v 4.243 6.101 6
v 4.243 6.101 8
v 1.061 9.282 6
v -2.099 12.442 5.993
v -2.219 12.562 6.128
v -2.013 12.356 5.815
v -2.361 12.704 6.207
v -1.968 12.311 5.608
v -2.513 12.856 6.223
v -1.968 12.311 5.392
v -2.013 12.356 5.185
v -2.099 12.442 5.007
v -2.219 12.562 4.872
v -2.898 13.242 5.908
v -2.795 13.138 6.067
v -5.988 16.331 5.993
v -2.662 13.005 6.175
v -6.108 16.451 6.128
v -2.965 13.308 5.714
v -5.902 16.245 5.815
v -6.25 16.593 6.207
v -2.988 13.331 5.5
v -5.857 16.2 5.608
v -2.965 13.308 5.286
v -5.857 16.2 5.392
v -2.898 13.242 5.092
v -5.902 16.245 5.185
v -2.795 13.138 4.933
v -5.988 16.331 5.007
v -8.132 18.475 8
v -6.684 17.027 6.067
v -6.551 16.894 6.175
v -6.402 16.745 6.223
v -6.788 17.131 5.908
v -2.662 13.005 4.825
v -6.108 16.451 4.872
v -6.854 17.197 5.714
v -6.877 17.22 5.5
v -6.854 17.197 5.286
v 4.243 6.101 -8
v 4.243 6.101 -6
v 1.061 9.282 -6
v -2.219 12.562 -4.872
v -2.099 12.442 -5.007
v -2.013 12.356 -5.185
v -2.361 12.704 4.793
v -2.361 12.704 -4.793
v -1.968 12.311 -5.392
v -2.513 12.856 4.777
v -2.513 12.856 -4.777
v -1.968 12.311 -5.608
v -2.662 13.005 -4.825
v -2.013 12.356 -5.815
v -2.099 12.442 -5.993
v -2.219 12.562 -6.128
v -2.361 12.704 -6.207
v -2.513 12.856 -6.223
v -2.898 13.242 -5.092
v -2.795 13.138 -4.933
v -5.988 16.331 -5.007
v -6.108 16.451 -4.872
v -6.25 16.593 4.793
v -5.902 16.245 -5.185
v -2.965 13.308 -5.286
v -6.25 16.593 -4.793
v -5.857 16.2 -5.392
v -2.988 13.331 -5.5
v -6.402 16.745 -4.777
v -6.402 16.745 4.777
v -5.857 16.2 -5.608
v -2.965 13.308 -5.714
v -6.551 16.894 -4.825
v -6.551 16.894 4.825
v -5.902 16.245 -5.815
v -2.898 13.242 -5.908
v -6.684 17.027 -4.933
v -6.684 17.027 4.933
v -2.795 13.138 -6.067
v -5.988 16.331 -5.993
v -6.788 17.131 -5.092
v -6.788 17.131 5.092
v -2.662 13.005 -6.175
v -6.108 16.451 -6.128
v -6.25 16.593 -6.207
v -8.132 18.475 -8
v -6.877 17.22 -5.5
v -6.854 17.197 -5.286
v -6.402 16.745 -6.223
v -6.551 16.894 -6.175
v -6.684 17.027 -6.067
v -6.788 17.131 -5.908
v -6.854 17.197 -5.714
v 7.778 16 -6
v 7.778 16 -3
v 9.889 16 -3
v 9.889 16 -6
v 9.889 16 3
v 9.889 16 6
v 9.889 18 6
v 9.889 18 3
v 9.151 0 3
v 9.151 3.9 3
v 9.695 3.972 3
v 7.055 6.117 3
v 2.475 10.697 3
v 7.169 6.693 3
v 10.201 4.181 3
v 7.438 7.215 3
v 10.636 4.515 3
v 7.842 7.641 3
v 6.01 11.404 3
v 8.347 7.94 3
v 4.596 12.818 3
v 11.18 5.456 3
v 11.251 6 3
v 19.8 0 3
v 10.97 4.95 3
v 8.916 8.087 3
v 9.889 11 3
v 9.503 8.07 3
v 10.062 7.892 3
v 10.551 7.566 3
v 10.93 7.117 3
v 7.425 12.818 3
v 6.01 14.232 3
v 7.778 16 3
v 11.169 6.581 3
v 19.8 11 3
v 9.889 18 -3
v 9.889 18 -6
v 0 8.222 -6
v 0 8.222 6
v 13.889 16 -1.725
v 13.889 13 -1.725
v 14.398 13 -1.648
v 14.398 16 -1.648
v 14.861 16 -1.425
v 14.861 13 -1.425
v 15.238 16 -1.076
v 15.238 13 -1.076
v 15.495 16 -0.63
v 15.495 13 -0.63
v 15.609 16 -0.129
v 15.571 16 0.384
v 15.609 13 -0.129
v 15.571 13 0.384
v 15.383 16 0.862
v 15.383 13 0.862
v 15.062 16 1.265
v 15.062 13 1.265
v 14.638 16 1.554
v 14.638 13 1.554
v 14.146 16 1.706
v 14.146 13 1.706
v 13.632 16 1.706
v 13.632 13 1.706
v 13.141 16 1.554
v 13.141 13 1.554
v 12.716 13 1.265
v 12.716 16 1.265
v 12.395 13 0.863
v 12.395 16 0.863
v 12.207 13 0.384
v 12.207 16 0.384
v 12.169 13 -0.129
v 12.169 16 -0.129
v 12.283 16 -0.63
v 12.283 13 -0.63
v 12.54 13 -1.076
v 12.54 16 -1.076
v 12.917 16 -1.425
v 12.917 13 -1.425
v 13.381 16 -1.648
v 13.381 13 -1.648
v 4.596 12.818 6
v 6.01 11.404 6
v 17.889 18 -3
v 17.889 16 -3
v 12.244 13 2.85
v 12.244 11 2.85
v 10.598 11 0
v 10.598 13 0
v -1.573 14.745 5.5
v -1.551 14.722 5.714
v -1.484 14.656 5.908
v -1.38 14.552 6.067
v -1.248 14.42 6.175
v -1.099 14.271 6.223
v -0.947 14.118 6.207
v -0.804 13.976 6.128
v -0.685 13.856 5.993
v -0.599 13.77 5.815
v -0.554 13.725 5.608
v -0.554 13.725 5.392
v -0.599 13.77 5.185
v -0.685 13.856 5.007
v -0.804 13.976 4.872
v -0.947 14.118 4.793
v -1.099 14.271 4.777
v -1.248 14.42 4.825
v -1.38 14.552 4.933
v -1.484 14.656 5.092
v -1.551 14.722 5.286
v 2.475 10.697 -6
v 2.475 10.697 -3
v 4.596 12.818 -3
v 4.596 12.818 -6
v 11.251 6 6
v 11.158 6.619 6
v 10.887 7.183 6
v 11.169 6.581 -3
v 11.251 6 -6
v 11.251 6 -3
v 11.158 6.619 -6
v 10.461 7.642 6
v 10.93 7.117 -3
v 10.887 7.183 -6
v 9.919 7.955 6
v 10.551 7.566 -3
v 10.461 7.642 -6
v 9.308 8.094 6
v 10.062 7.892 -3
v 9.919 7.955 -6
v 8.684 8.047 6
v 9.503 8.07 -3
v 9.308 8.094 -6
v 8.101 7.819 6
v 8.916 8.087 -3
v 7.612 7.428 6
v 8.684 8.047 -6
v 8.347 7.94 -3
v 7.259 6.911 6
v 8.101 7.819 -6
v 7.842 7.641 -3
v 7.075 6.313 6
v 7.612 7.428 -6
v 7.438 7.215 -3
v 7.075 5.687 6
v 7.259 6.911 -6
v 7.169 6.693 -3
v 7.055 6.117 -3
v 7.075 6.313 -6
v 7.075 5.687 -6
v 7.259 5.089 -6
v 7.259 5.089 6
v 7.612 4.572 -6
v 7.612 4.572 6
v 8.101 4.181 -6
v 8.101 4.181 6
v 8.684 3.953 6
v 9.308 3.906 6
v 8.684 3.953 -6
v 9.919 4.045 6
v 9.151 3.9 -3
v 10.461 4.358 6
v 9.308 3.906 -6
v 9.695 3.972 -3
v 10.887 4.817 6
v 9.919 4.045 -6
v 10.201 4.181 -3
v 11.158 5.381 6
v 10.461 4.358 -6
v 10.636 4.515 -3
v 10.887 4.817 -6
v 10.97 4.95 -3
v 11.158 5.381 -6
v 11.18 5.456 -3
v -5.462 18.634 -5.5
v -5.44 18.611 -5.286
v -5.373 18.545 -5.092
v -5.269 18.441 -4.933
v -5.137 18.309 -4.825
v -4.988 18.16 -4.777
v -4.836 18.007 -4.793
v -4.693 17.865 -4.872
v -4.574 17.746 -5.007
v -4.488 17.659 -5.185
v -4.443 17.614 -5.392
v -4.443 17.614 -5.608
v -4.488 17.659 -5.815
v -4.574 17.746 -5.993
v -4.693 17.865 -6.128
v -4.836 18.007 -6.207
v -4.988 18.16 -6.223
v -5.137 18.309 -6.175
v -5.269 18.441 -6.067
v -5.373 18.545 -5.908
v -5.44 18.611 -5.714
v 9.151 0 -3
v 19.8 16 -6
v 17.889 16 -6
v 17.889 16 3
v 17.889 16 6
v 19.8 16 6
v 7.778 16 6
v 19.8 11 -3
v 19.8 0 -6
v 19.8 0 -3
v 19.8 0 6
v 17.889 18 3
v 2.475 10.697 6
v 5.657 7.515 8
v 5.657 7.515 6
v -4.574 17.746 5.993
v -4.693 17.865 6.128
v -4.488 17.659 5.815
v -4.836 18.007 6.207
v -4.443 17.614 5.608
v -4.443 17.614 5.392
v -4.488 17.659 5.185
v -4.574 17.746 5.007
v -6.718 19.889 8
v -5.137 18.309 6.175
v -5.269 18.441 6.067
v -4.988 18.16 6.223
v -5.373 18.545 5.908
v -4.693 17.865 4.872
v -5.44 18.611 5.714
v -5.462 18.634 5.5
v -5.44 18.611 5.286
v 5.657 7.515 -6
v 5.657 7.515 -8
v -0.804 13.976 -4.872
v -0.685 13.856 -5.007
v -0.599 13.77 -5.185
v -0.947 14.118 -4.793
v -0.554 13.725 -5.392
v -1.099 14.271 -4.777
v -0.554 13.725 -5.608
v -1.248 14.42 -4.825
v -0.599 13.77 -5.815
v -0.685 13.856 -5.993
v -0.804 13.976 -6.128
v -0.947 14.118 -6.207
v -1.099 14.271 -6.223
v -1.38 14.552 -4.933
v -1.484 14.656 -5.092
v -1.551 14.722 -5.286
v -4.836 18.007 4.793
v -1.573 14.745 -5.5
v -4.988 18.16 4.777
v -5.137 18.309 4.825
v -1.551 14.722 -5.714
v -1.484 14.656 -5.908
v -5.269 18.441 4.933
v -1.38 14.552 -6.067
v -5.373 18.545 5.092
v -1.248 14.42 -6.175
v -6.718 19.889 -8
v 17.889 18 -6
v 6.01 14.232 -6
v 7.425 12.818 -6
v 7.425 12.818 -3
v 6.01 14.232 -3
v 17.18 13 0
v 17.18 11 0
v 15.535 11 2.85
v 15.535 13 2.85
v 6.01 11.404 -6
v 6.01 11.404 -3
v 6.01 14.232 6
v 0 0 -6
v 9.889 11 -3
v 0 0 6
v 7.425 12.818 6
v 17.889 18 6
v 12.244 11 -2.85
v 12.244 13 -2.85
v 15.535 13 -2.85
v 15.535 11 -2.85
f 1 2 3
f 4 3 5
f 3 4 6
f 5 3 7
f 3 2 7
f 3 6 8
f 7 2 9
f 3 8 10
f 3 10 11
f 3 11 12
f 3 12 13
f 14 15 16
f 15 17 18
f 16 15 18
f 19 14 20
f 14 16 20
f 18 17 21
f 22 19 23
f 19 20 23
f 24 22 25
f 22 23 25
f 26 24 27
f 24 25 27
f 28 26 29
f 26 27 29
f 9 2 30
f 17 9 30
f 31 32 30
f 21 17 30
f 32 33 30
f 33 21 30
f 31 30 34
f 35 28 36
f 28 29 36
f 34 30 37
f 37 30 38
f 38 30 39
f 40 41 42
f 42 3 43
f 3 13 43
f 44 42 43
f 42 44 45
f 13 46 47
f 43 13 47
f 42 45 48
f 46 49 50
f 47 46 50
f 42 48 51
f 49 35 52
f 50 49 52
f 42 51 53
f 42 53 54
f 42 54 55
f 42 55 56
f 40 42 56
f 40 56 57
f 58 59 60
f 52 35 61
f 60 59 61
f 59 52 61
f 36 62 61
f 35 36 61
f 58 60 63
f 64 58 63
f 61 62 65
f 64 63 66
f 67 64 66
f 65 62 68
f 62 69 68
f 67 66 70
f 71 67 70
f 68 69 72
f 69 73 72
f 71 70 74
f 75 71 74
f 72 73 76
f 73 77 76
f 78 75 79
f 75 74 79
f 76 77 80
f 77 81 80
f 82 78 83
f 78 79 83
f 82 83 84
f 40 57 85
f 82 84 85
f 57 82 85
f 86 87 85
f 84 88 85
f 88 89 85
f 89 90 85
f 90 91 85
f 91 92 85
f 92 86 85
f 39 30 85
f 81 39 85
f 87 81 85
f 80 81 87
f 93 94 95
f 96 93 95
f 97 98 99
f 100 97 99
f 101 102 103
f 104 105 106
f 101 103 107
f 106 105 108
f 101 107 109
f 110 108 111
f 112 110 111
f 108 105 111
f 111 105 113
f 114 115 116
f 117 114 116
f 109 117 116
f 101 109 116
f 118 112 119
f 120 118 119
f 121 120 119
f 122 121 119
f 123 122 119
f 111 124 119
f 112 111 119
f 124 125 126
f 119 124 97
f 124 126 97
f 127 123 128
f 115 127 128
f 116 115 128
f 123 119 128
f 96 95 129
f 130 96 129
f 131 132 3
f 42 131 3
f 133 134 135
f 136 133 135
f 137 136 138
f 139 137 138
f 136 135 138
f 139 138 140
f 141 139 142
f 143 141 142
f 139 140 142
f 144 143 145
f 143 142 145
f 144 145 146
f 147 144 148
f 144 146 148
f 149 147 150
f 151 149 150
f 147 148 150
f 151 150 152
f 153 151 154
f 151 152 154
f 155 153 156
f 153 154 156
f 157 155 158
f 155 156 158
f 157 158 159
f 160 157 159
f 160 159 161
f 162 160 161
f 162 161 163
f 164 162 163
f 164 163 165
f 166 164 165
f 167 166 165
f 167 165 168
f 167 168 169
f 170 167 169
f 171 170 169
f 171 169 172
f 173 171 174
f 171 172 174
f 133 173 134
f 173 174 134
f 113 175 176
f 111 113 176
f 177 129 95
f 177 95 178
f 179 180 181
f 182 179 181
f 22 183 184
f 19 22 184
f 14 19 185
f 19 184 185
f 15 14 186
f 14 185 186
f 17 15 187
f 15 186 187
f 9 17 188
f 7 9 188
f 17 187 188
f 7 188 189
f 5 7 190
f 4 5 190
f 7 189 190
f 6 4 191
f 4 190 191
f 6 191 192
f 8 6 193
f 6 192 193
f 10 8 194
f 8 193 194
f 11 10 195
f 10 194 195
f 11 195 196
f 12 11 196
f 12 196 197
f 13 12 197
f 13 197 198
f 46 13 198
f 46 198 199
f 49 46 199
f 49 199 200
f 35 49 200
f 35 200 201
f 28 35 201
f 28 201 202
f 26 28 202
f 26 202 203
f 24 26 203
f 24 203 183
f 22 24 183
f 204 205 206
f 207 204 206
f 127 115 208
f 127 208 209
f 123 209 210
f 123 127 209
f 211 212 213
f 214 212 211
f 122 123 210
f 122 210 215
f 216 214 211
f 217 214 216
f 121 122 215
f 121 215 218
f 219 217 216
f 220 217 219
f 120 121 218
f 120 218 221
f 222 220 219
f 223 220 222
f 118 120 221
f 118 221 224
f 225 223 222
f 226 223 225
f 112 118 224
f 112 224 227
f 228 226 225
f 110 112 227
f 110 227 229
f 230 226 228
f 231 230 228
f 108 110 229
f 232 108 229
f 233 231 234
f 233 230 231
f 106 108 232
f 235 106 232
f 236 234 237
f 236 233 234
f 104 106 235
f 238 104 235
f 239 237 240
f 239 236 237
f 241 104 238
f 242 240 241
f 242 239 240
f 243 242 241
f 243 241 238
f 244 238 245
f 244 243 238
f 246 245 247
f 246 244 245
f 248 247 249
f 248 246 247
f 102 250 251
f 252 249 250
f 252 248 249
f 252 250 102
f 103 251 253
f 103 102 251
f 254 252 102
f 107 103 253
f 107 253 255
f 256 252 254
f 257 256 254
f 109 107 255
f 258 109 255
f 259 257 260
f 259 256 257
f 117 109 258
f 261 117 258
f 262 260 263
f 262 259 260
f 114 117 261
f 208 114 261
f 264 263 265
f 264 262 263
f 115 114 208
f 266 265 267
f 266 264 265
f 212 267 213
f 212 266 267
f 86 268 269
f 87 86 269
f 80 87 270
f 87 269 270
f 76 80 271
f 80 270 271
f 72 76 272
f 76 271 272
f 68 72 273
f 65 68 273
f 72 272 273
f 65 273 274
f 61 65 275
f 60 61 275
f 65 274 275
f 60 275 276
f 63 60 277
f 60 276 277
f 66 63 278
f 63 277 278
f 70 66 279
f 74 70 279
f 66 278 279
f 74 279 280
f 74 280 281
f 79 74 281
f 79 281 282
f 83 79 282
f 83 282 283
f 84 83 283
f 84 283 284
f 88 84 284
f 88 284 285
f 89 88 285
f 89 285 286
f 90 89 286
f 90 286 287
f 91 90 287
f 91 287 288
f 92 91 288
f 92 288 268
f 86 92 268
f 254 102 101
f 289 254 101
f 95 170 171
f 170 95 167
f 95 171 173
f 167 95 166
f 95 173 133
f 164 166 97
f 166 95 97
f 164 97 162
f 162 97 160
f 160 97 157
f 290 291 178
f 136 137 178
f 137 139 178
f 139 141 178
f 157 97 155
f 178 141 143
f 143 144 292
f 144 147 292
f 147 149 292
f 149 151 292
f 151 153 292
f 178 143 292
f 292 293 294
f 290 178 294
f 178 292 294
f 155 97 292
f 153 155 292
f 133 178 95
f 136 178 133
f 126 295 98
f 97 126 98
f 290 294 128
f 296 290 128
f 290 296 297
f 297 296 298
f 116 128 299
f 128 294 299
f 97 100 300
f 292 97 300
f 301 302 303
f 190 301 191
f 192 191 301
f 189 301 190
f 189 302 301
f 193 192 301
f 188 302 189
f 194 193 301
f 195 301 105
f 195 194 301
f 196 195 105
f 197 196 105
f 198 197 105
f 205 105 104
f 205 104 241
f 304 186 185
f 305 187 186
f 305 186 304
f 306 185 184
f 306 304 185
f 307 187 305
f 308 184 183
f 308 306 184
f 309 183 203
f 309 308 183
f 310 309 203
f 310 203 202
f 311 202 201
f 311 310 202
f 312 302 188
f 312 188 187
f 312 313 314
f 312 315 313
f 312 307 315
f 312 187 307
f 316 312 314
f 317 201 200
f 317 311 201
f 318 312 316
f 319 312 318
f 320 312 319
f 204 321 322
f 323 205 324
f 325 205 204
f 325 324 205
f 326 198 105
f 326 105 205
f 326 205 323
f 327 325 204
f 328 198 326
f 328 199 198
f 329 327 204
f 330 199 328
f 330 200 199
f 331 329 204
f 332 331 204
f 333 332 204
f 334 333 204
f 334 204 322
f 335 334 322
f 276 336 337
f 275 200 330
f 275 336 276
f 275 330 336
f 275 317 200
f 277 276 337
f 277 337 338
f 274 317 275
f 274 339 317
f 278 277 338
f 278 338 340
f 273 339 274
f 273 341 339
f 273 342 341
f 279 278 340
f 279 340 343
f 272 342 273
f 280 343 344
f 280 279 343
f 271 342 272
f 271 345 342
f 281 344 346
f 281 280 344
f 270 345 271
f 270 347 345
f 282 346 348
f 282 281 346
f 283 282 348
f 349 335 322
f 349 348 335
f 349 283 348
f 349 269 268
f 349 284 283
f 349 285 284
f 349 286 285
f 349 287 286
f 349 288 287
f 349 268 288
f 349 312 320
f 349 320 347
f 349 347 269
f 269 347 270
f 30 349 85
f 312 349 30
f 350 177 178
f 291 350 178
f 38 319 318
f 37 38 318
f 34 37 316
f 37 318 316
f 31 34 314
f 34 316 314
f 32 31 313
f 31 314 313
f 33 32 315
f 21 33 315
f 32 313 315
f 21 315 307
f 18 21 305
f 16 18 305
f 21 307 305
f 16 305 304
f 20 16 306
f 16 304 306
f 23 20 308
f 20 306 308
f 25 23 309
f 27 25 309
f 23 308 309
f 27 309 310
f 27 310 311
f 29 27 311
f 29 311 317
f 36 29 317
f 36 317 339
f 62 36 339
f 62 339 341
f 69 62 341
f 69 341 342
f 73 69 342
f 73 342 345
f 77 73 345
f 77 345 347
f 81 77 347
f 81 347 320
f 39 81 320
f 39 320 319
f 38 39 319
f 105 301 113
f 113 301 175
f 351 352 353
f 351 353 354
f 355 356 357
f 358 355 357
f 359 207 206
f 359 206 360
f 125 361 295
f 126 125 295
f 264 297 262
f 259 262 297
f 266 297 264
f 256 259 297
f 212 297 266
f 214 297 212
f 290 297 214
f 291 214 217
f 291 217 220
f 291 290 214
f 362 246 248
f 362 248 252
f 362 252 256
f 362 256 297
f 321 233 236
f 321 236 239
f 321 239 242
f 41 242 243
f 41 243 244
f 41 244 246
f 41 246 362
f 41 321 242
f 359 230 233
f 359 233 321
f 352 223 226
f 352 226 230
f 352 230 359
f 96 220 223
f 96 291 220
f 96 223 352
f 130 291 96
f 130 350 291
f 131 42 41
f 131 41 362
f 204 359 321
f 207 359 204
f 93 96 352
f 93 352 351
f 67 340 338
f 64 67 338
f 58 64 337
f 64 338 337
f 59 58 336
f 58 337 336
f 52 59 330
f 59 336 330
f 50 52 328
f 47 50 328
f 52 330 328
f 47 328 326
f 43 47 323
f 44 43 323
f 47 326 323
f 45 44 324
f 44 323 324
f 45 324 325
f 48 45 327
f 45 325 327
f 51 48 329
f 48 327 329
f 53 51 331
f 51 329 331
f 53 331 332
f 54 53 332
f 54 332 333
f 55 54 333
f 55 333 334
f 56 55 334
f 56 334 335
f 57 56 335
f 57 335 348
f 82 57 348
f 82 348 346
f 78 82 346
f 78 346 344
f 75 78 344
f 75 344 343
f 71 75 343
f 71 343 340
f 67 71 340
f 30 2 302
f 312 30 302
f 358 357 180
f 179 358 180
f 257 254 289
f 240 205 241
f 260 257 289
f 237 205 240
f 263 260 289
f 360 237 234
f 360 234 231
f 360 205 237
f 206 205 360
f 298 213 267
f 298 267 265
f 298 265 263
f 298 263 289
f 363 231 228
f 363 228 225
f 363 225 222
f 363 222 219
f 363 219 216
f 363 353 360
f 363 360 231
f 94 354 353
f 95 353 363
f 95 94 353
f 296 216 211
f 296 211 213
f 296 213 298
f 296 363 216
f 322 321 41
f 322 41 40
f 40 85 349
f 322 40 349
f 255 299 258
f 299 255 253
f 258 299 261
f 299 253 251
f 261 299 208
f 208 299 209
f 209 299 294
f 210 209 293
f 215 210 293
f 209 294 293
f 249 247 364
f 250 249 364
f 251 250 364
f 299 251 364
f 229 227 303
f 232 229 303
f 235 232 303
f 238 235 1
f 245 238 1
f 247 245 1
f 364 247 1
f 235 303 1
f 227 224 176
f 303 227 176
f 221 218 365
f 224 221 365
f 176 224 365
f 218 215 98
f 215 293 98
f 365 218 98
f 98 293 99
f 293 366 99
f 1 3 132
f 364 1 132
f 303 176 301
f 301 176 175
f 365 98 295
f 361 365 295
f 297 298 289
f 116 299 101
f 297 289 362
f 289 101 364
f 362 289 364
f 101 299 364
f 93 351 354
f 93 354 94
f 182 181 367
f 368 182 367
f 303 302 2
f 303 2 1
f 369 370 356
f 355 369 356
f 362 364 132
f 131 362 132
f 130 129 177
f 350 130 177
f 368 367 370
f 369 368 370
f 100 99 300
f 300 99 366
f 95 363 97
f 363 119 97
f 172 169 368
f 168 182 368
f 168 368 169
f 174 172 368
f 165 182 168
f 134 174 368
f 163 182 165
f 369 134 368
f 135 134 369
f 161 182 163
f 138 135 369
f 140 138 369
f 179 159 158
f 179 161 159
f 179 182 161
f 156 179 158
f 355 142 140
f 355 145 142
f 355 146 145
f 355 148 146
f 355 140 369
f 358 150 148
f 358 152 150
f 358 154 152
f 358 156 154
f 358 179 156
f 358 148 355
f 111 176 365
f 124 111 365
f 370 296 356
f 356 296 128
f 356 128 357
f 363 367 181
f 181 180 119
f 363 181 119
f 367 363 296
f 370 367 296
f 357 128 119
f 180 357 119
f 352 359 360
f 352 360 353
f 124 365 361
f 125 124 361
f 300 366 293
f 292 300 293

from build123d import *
from build123d.topology import SkipClean

# Parameters (mm, degrees)
SKETCH1_R                        = 2.1
FINGER_BASE_1_DEPTH              = 6
SKETCH2_W                        = 16
SKETCH2_H                        = 2
FLEXURE_JOINT_BASE_DEPTH         = 13
SKETCH3_W                        = 8
SKETCH3_H                        = 2
PULLEY_HOUSING_DEPTH             = 3
M3_NUT_DEPTH                     = 2
SKETCH5_R                        = 1.725
M3_HOLE_DEPTH                    = 3
SKETCH9_W                        = 2
SKETCH9_H                        = 2
SUPPORT_FLEXURE_JOINT_BASE_DEPTH = 4.5
SKETCH10_R                       = 0.725
HOLE_FOR_STICHING_DEPTH          = 22.391190815
CUT_EXTRUDE1_DEPTH               = 32.362649657
CUT_EXTRUDE1_DEPTH_BACK          = 32.362649657


with BuildPart() as part:
    # Sketch1 → Finger Base 1 (new, symmetric)
    with BuildSketch(Plane.XY):
        Polygon((0, 8.221825407), (7.778174593, 16), (9.889087297, 16), (9.889087297, 18), (17.889087297, 18), (17.889087297, 16), (19.8, 16), (19.8, 0), (0, 0), align=None)
        with Locations((9.151471863, 6)):
            Circle(SKETCH1_R, mode=Mode.SUBTRACT)
    extrude(amount=FINGER_BASE_1_DEPTH, both=True)

    # Sketch2 → Flexure Joint Base (add)
    with BuildSketch(Plane(origin=(-4.110912703, 4.110912703, 0), x_dir=(0, 0, 1), z_dir=(-0.7071067811865462, 0.707106781186549, 0))):
        with Locations((0, 8.313708499)):
            Rectangle(SKETCH2_W, SKETCH2_H)
    extrude(amount=FLEXURE_JOINT_BASE_DEPTH)

    # Sketch3 → Pulley Housing (cut, symmetric)
    with SkipClean():  # the faces are left unmerged after this step: merging them gives an invalid solid
        with BuildSketch(Plane.XY):
            with BuildLine():
                ThreePointArc((7.054725188, 6.116847687), (7.62579494, 4.556978889), (9.151471863, 3.9))
                Line((9.151471863, 3.9), (9.151471863, 0))
                Line((9.151471863, 0), (19.8, 0))
                Line((19.8, 0), (19.8, 11))
                Line((19.8, 11), (9.889087297, 11))
                Line((9.889087297, 11), (9.889087297, 16))
                Line((9.889087297, 16), (7.778174593, 16))
                Line((7.778174593, 16), (2.474873734, 10.696699141))
                Line((2.474873734, 10.696699141), (7.054725188, 6.116847687))
            make_face()
            with Locations((13.889087297, 17)):
                Rectangle(SKETCH3_W, SKETCH3_H)
        extrude(amount=PULLEY_HOUSING_DEPTH, both=True, mode=Mode.SUBTRACT)
    add(part.part.scale(1), mode=Mode.REPLACE)  # the faces are merged on a copy

    # Sketch4 → M3 Nut (cut)
    with BuildSketch(Plane.XZ.offset(-11)):
        Polygon((10.598190762, 0), (12.243639029, -2.85), (15.534535564, -2.85), (17.179983831, 0), (15.534535564, 2.85), (12.243639029, 2.85), align=None)
    extrude(amount=-M3_NUT_DEPTH, mode=Mode.SUBTRACT)

    # Sketch5 → M3 Hole (cut)
    with BuildSketch(Plane.XZ.offset(-13)):
        with Locations(Location((13.889087297, 0, 0), (0, 0, 270))):
            Circle(SKETCH5_R)
    extrude(amount=-M3_HOLE_DEPTH, mode=Mode.SUBTRACT)

    # Sketch9 → Support Flexure Joint Base (add)
    with BuildSketch(Plane(origin=(-4.110912703, 4.110912703, 0), x_dir=(0, 0, -1), z_dir=(0.7071067811865462, -0.7071067811865488, 0))):
        with Locations((-7, 8.313708499)):
            Rectangle(SKETCH9_W, SKETCH9_H)
        with Locations((7, 8.313708499)):
            Rectangle(SKETCH9_W, SKETCH9_H)
    extrude(amount=SUPPORT_FLEXURE_JOINT_BASE_DEPTH)

    # Sketch10 → Hole For Stiching (cut, through all)
    with BuildSketch(Plane(origin=(6.585786438, 6.585786438, 0), x_dir=(0.7071067811865462, -0.707106781186549, 0), z_dir=(0.707106781186549, 0.7071067811865462, 0))):
        with Locations(Location((-16.313708499, -5.5, 0), (0, 0, 180))):
            Circle(SKETCH10_R)
        with Locations(Location((-10.813708499, -5.5, 0), (0, 0, 180))):
            Circle(SKETCH10_R)
        with Locations(Location((-10.813708499, 5.5, 0), (0, 0, 180))):
            Circle(SKETCH10_R)
        with Locations(Location((-16.313708499, 5.5, 0), (0, 0, 180))):
            Circle(SKETCH10_R)
    extrude(amount=-HOLE_FOR_STICHING_DEPTH, mode=Mode.SUBTRACT)

    # Sketch11 → Cut-Extrude1 (cut, two sides: drawn at the far end of the back side and taken through both)
    with BuildSketch(Plane.XY.offset(6).offset(-CUT_EXTRUDE1_DEPTH_BACK)):
        Polygon((-30.849385448, 48.263599011), (4.596194078, 12.818019485), (6.01040764, 11.403805922), (7.424621202, 12.818019485), (6.01040764, 14.232233047), (-29.435171886, 49.677812573), (-100.326330938, 120.568971625), (-101.7405445, 119.154758062), align=None)
    extrude(amount=CUT_EXTRUDE1_DEPTH + CUT_EXTRUDE1_DEPTH_BACK, mode=Mode.SUBTRACT)


solid = part.part
